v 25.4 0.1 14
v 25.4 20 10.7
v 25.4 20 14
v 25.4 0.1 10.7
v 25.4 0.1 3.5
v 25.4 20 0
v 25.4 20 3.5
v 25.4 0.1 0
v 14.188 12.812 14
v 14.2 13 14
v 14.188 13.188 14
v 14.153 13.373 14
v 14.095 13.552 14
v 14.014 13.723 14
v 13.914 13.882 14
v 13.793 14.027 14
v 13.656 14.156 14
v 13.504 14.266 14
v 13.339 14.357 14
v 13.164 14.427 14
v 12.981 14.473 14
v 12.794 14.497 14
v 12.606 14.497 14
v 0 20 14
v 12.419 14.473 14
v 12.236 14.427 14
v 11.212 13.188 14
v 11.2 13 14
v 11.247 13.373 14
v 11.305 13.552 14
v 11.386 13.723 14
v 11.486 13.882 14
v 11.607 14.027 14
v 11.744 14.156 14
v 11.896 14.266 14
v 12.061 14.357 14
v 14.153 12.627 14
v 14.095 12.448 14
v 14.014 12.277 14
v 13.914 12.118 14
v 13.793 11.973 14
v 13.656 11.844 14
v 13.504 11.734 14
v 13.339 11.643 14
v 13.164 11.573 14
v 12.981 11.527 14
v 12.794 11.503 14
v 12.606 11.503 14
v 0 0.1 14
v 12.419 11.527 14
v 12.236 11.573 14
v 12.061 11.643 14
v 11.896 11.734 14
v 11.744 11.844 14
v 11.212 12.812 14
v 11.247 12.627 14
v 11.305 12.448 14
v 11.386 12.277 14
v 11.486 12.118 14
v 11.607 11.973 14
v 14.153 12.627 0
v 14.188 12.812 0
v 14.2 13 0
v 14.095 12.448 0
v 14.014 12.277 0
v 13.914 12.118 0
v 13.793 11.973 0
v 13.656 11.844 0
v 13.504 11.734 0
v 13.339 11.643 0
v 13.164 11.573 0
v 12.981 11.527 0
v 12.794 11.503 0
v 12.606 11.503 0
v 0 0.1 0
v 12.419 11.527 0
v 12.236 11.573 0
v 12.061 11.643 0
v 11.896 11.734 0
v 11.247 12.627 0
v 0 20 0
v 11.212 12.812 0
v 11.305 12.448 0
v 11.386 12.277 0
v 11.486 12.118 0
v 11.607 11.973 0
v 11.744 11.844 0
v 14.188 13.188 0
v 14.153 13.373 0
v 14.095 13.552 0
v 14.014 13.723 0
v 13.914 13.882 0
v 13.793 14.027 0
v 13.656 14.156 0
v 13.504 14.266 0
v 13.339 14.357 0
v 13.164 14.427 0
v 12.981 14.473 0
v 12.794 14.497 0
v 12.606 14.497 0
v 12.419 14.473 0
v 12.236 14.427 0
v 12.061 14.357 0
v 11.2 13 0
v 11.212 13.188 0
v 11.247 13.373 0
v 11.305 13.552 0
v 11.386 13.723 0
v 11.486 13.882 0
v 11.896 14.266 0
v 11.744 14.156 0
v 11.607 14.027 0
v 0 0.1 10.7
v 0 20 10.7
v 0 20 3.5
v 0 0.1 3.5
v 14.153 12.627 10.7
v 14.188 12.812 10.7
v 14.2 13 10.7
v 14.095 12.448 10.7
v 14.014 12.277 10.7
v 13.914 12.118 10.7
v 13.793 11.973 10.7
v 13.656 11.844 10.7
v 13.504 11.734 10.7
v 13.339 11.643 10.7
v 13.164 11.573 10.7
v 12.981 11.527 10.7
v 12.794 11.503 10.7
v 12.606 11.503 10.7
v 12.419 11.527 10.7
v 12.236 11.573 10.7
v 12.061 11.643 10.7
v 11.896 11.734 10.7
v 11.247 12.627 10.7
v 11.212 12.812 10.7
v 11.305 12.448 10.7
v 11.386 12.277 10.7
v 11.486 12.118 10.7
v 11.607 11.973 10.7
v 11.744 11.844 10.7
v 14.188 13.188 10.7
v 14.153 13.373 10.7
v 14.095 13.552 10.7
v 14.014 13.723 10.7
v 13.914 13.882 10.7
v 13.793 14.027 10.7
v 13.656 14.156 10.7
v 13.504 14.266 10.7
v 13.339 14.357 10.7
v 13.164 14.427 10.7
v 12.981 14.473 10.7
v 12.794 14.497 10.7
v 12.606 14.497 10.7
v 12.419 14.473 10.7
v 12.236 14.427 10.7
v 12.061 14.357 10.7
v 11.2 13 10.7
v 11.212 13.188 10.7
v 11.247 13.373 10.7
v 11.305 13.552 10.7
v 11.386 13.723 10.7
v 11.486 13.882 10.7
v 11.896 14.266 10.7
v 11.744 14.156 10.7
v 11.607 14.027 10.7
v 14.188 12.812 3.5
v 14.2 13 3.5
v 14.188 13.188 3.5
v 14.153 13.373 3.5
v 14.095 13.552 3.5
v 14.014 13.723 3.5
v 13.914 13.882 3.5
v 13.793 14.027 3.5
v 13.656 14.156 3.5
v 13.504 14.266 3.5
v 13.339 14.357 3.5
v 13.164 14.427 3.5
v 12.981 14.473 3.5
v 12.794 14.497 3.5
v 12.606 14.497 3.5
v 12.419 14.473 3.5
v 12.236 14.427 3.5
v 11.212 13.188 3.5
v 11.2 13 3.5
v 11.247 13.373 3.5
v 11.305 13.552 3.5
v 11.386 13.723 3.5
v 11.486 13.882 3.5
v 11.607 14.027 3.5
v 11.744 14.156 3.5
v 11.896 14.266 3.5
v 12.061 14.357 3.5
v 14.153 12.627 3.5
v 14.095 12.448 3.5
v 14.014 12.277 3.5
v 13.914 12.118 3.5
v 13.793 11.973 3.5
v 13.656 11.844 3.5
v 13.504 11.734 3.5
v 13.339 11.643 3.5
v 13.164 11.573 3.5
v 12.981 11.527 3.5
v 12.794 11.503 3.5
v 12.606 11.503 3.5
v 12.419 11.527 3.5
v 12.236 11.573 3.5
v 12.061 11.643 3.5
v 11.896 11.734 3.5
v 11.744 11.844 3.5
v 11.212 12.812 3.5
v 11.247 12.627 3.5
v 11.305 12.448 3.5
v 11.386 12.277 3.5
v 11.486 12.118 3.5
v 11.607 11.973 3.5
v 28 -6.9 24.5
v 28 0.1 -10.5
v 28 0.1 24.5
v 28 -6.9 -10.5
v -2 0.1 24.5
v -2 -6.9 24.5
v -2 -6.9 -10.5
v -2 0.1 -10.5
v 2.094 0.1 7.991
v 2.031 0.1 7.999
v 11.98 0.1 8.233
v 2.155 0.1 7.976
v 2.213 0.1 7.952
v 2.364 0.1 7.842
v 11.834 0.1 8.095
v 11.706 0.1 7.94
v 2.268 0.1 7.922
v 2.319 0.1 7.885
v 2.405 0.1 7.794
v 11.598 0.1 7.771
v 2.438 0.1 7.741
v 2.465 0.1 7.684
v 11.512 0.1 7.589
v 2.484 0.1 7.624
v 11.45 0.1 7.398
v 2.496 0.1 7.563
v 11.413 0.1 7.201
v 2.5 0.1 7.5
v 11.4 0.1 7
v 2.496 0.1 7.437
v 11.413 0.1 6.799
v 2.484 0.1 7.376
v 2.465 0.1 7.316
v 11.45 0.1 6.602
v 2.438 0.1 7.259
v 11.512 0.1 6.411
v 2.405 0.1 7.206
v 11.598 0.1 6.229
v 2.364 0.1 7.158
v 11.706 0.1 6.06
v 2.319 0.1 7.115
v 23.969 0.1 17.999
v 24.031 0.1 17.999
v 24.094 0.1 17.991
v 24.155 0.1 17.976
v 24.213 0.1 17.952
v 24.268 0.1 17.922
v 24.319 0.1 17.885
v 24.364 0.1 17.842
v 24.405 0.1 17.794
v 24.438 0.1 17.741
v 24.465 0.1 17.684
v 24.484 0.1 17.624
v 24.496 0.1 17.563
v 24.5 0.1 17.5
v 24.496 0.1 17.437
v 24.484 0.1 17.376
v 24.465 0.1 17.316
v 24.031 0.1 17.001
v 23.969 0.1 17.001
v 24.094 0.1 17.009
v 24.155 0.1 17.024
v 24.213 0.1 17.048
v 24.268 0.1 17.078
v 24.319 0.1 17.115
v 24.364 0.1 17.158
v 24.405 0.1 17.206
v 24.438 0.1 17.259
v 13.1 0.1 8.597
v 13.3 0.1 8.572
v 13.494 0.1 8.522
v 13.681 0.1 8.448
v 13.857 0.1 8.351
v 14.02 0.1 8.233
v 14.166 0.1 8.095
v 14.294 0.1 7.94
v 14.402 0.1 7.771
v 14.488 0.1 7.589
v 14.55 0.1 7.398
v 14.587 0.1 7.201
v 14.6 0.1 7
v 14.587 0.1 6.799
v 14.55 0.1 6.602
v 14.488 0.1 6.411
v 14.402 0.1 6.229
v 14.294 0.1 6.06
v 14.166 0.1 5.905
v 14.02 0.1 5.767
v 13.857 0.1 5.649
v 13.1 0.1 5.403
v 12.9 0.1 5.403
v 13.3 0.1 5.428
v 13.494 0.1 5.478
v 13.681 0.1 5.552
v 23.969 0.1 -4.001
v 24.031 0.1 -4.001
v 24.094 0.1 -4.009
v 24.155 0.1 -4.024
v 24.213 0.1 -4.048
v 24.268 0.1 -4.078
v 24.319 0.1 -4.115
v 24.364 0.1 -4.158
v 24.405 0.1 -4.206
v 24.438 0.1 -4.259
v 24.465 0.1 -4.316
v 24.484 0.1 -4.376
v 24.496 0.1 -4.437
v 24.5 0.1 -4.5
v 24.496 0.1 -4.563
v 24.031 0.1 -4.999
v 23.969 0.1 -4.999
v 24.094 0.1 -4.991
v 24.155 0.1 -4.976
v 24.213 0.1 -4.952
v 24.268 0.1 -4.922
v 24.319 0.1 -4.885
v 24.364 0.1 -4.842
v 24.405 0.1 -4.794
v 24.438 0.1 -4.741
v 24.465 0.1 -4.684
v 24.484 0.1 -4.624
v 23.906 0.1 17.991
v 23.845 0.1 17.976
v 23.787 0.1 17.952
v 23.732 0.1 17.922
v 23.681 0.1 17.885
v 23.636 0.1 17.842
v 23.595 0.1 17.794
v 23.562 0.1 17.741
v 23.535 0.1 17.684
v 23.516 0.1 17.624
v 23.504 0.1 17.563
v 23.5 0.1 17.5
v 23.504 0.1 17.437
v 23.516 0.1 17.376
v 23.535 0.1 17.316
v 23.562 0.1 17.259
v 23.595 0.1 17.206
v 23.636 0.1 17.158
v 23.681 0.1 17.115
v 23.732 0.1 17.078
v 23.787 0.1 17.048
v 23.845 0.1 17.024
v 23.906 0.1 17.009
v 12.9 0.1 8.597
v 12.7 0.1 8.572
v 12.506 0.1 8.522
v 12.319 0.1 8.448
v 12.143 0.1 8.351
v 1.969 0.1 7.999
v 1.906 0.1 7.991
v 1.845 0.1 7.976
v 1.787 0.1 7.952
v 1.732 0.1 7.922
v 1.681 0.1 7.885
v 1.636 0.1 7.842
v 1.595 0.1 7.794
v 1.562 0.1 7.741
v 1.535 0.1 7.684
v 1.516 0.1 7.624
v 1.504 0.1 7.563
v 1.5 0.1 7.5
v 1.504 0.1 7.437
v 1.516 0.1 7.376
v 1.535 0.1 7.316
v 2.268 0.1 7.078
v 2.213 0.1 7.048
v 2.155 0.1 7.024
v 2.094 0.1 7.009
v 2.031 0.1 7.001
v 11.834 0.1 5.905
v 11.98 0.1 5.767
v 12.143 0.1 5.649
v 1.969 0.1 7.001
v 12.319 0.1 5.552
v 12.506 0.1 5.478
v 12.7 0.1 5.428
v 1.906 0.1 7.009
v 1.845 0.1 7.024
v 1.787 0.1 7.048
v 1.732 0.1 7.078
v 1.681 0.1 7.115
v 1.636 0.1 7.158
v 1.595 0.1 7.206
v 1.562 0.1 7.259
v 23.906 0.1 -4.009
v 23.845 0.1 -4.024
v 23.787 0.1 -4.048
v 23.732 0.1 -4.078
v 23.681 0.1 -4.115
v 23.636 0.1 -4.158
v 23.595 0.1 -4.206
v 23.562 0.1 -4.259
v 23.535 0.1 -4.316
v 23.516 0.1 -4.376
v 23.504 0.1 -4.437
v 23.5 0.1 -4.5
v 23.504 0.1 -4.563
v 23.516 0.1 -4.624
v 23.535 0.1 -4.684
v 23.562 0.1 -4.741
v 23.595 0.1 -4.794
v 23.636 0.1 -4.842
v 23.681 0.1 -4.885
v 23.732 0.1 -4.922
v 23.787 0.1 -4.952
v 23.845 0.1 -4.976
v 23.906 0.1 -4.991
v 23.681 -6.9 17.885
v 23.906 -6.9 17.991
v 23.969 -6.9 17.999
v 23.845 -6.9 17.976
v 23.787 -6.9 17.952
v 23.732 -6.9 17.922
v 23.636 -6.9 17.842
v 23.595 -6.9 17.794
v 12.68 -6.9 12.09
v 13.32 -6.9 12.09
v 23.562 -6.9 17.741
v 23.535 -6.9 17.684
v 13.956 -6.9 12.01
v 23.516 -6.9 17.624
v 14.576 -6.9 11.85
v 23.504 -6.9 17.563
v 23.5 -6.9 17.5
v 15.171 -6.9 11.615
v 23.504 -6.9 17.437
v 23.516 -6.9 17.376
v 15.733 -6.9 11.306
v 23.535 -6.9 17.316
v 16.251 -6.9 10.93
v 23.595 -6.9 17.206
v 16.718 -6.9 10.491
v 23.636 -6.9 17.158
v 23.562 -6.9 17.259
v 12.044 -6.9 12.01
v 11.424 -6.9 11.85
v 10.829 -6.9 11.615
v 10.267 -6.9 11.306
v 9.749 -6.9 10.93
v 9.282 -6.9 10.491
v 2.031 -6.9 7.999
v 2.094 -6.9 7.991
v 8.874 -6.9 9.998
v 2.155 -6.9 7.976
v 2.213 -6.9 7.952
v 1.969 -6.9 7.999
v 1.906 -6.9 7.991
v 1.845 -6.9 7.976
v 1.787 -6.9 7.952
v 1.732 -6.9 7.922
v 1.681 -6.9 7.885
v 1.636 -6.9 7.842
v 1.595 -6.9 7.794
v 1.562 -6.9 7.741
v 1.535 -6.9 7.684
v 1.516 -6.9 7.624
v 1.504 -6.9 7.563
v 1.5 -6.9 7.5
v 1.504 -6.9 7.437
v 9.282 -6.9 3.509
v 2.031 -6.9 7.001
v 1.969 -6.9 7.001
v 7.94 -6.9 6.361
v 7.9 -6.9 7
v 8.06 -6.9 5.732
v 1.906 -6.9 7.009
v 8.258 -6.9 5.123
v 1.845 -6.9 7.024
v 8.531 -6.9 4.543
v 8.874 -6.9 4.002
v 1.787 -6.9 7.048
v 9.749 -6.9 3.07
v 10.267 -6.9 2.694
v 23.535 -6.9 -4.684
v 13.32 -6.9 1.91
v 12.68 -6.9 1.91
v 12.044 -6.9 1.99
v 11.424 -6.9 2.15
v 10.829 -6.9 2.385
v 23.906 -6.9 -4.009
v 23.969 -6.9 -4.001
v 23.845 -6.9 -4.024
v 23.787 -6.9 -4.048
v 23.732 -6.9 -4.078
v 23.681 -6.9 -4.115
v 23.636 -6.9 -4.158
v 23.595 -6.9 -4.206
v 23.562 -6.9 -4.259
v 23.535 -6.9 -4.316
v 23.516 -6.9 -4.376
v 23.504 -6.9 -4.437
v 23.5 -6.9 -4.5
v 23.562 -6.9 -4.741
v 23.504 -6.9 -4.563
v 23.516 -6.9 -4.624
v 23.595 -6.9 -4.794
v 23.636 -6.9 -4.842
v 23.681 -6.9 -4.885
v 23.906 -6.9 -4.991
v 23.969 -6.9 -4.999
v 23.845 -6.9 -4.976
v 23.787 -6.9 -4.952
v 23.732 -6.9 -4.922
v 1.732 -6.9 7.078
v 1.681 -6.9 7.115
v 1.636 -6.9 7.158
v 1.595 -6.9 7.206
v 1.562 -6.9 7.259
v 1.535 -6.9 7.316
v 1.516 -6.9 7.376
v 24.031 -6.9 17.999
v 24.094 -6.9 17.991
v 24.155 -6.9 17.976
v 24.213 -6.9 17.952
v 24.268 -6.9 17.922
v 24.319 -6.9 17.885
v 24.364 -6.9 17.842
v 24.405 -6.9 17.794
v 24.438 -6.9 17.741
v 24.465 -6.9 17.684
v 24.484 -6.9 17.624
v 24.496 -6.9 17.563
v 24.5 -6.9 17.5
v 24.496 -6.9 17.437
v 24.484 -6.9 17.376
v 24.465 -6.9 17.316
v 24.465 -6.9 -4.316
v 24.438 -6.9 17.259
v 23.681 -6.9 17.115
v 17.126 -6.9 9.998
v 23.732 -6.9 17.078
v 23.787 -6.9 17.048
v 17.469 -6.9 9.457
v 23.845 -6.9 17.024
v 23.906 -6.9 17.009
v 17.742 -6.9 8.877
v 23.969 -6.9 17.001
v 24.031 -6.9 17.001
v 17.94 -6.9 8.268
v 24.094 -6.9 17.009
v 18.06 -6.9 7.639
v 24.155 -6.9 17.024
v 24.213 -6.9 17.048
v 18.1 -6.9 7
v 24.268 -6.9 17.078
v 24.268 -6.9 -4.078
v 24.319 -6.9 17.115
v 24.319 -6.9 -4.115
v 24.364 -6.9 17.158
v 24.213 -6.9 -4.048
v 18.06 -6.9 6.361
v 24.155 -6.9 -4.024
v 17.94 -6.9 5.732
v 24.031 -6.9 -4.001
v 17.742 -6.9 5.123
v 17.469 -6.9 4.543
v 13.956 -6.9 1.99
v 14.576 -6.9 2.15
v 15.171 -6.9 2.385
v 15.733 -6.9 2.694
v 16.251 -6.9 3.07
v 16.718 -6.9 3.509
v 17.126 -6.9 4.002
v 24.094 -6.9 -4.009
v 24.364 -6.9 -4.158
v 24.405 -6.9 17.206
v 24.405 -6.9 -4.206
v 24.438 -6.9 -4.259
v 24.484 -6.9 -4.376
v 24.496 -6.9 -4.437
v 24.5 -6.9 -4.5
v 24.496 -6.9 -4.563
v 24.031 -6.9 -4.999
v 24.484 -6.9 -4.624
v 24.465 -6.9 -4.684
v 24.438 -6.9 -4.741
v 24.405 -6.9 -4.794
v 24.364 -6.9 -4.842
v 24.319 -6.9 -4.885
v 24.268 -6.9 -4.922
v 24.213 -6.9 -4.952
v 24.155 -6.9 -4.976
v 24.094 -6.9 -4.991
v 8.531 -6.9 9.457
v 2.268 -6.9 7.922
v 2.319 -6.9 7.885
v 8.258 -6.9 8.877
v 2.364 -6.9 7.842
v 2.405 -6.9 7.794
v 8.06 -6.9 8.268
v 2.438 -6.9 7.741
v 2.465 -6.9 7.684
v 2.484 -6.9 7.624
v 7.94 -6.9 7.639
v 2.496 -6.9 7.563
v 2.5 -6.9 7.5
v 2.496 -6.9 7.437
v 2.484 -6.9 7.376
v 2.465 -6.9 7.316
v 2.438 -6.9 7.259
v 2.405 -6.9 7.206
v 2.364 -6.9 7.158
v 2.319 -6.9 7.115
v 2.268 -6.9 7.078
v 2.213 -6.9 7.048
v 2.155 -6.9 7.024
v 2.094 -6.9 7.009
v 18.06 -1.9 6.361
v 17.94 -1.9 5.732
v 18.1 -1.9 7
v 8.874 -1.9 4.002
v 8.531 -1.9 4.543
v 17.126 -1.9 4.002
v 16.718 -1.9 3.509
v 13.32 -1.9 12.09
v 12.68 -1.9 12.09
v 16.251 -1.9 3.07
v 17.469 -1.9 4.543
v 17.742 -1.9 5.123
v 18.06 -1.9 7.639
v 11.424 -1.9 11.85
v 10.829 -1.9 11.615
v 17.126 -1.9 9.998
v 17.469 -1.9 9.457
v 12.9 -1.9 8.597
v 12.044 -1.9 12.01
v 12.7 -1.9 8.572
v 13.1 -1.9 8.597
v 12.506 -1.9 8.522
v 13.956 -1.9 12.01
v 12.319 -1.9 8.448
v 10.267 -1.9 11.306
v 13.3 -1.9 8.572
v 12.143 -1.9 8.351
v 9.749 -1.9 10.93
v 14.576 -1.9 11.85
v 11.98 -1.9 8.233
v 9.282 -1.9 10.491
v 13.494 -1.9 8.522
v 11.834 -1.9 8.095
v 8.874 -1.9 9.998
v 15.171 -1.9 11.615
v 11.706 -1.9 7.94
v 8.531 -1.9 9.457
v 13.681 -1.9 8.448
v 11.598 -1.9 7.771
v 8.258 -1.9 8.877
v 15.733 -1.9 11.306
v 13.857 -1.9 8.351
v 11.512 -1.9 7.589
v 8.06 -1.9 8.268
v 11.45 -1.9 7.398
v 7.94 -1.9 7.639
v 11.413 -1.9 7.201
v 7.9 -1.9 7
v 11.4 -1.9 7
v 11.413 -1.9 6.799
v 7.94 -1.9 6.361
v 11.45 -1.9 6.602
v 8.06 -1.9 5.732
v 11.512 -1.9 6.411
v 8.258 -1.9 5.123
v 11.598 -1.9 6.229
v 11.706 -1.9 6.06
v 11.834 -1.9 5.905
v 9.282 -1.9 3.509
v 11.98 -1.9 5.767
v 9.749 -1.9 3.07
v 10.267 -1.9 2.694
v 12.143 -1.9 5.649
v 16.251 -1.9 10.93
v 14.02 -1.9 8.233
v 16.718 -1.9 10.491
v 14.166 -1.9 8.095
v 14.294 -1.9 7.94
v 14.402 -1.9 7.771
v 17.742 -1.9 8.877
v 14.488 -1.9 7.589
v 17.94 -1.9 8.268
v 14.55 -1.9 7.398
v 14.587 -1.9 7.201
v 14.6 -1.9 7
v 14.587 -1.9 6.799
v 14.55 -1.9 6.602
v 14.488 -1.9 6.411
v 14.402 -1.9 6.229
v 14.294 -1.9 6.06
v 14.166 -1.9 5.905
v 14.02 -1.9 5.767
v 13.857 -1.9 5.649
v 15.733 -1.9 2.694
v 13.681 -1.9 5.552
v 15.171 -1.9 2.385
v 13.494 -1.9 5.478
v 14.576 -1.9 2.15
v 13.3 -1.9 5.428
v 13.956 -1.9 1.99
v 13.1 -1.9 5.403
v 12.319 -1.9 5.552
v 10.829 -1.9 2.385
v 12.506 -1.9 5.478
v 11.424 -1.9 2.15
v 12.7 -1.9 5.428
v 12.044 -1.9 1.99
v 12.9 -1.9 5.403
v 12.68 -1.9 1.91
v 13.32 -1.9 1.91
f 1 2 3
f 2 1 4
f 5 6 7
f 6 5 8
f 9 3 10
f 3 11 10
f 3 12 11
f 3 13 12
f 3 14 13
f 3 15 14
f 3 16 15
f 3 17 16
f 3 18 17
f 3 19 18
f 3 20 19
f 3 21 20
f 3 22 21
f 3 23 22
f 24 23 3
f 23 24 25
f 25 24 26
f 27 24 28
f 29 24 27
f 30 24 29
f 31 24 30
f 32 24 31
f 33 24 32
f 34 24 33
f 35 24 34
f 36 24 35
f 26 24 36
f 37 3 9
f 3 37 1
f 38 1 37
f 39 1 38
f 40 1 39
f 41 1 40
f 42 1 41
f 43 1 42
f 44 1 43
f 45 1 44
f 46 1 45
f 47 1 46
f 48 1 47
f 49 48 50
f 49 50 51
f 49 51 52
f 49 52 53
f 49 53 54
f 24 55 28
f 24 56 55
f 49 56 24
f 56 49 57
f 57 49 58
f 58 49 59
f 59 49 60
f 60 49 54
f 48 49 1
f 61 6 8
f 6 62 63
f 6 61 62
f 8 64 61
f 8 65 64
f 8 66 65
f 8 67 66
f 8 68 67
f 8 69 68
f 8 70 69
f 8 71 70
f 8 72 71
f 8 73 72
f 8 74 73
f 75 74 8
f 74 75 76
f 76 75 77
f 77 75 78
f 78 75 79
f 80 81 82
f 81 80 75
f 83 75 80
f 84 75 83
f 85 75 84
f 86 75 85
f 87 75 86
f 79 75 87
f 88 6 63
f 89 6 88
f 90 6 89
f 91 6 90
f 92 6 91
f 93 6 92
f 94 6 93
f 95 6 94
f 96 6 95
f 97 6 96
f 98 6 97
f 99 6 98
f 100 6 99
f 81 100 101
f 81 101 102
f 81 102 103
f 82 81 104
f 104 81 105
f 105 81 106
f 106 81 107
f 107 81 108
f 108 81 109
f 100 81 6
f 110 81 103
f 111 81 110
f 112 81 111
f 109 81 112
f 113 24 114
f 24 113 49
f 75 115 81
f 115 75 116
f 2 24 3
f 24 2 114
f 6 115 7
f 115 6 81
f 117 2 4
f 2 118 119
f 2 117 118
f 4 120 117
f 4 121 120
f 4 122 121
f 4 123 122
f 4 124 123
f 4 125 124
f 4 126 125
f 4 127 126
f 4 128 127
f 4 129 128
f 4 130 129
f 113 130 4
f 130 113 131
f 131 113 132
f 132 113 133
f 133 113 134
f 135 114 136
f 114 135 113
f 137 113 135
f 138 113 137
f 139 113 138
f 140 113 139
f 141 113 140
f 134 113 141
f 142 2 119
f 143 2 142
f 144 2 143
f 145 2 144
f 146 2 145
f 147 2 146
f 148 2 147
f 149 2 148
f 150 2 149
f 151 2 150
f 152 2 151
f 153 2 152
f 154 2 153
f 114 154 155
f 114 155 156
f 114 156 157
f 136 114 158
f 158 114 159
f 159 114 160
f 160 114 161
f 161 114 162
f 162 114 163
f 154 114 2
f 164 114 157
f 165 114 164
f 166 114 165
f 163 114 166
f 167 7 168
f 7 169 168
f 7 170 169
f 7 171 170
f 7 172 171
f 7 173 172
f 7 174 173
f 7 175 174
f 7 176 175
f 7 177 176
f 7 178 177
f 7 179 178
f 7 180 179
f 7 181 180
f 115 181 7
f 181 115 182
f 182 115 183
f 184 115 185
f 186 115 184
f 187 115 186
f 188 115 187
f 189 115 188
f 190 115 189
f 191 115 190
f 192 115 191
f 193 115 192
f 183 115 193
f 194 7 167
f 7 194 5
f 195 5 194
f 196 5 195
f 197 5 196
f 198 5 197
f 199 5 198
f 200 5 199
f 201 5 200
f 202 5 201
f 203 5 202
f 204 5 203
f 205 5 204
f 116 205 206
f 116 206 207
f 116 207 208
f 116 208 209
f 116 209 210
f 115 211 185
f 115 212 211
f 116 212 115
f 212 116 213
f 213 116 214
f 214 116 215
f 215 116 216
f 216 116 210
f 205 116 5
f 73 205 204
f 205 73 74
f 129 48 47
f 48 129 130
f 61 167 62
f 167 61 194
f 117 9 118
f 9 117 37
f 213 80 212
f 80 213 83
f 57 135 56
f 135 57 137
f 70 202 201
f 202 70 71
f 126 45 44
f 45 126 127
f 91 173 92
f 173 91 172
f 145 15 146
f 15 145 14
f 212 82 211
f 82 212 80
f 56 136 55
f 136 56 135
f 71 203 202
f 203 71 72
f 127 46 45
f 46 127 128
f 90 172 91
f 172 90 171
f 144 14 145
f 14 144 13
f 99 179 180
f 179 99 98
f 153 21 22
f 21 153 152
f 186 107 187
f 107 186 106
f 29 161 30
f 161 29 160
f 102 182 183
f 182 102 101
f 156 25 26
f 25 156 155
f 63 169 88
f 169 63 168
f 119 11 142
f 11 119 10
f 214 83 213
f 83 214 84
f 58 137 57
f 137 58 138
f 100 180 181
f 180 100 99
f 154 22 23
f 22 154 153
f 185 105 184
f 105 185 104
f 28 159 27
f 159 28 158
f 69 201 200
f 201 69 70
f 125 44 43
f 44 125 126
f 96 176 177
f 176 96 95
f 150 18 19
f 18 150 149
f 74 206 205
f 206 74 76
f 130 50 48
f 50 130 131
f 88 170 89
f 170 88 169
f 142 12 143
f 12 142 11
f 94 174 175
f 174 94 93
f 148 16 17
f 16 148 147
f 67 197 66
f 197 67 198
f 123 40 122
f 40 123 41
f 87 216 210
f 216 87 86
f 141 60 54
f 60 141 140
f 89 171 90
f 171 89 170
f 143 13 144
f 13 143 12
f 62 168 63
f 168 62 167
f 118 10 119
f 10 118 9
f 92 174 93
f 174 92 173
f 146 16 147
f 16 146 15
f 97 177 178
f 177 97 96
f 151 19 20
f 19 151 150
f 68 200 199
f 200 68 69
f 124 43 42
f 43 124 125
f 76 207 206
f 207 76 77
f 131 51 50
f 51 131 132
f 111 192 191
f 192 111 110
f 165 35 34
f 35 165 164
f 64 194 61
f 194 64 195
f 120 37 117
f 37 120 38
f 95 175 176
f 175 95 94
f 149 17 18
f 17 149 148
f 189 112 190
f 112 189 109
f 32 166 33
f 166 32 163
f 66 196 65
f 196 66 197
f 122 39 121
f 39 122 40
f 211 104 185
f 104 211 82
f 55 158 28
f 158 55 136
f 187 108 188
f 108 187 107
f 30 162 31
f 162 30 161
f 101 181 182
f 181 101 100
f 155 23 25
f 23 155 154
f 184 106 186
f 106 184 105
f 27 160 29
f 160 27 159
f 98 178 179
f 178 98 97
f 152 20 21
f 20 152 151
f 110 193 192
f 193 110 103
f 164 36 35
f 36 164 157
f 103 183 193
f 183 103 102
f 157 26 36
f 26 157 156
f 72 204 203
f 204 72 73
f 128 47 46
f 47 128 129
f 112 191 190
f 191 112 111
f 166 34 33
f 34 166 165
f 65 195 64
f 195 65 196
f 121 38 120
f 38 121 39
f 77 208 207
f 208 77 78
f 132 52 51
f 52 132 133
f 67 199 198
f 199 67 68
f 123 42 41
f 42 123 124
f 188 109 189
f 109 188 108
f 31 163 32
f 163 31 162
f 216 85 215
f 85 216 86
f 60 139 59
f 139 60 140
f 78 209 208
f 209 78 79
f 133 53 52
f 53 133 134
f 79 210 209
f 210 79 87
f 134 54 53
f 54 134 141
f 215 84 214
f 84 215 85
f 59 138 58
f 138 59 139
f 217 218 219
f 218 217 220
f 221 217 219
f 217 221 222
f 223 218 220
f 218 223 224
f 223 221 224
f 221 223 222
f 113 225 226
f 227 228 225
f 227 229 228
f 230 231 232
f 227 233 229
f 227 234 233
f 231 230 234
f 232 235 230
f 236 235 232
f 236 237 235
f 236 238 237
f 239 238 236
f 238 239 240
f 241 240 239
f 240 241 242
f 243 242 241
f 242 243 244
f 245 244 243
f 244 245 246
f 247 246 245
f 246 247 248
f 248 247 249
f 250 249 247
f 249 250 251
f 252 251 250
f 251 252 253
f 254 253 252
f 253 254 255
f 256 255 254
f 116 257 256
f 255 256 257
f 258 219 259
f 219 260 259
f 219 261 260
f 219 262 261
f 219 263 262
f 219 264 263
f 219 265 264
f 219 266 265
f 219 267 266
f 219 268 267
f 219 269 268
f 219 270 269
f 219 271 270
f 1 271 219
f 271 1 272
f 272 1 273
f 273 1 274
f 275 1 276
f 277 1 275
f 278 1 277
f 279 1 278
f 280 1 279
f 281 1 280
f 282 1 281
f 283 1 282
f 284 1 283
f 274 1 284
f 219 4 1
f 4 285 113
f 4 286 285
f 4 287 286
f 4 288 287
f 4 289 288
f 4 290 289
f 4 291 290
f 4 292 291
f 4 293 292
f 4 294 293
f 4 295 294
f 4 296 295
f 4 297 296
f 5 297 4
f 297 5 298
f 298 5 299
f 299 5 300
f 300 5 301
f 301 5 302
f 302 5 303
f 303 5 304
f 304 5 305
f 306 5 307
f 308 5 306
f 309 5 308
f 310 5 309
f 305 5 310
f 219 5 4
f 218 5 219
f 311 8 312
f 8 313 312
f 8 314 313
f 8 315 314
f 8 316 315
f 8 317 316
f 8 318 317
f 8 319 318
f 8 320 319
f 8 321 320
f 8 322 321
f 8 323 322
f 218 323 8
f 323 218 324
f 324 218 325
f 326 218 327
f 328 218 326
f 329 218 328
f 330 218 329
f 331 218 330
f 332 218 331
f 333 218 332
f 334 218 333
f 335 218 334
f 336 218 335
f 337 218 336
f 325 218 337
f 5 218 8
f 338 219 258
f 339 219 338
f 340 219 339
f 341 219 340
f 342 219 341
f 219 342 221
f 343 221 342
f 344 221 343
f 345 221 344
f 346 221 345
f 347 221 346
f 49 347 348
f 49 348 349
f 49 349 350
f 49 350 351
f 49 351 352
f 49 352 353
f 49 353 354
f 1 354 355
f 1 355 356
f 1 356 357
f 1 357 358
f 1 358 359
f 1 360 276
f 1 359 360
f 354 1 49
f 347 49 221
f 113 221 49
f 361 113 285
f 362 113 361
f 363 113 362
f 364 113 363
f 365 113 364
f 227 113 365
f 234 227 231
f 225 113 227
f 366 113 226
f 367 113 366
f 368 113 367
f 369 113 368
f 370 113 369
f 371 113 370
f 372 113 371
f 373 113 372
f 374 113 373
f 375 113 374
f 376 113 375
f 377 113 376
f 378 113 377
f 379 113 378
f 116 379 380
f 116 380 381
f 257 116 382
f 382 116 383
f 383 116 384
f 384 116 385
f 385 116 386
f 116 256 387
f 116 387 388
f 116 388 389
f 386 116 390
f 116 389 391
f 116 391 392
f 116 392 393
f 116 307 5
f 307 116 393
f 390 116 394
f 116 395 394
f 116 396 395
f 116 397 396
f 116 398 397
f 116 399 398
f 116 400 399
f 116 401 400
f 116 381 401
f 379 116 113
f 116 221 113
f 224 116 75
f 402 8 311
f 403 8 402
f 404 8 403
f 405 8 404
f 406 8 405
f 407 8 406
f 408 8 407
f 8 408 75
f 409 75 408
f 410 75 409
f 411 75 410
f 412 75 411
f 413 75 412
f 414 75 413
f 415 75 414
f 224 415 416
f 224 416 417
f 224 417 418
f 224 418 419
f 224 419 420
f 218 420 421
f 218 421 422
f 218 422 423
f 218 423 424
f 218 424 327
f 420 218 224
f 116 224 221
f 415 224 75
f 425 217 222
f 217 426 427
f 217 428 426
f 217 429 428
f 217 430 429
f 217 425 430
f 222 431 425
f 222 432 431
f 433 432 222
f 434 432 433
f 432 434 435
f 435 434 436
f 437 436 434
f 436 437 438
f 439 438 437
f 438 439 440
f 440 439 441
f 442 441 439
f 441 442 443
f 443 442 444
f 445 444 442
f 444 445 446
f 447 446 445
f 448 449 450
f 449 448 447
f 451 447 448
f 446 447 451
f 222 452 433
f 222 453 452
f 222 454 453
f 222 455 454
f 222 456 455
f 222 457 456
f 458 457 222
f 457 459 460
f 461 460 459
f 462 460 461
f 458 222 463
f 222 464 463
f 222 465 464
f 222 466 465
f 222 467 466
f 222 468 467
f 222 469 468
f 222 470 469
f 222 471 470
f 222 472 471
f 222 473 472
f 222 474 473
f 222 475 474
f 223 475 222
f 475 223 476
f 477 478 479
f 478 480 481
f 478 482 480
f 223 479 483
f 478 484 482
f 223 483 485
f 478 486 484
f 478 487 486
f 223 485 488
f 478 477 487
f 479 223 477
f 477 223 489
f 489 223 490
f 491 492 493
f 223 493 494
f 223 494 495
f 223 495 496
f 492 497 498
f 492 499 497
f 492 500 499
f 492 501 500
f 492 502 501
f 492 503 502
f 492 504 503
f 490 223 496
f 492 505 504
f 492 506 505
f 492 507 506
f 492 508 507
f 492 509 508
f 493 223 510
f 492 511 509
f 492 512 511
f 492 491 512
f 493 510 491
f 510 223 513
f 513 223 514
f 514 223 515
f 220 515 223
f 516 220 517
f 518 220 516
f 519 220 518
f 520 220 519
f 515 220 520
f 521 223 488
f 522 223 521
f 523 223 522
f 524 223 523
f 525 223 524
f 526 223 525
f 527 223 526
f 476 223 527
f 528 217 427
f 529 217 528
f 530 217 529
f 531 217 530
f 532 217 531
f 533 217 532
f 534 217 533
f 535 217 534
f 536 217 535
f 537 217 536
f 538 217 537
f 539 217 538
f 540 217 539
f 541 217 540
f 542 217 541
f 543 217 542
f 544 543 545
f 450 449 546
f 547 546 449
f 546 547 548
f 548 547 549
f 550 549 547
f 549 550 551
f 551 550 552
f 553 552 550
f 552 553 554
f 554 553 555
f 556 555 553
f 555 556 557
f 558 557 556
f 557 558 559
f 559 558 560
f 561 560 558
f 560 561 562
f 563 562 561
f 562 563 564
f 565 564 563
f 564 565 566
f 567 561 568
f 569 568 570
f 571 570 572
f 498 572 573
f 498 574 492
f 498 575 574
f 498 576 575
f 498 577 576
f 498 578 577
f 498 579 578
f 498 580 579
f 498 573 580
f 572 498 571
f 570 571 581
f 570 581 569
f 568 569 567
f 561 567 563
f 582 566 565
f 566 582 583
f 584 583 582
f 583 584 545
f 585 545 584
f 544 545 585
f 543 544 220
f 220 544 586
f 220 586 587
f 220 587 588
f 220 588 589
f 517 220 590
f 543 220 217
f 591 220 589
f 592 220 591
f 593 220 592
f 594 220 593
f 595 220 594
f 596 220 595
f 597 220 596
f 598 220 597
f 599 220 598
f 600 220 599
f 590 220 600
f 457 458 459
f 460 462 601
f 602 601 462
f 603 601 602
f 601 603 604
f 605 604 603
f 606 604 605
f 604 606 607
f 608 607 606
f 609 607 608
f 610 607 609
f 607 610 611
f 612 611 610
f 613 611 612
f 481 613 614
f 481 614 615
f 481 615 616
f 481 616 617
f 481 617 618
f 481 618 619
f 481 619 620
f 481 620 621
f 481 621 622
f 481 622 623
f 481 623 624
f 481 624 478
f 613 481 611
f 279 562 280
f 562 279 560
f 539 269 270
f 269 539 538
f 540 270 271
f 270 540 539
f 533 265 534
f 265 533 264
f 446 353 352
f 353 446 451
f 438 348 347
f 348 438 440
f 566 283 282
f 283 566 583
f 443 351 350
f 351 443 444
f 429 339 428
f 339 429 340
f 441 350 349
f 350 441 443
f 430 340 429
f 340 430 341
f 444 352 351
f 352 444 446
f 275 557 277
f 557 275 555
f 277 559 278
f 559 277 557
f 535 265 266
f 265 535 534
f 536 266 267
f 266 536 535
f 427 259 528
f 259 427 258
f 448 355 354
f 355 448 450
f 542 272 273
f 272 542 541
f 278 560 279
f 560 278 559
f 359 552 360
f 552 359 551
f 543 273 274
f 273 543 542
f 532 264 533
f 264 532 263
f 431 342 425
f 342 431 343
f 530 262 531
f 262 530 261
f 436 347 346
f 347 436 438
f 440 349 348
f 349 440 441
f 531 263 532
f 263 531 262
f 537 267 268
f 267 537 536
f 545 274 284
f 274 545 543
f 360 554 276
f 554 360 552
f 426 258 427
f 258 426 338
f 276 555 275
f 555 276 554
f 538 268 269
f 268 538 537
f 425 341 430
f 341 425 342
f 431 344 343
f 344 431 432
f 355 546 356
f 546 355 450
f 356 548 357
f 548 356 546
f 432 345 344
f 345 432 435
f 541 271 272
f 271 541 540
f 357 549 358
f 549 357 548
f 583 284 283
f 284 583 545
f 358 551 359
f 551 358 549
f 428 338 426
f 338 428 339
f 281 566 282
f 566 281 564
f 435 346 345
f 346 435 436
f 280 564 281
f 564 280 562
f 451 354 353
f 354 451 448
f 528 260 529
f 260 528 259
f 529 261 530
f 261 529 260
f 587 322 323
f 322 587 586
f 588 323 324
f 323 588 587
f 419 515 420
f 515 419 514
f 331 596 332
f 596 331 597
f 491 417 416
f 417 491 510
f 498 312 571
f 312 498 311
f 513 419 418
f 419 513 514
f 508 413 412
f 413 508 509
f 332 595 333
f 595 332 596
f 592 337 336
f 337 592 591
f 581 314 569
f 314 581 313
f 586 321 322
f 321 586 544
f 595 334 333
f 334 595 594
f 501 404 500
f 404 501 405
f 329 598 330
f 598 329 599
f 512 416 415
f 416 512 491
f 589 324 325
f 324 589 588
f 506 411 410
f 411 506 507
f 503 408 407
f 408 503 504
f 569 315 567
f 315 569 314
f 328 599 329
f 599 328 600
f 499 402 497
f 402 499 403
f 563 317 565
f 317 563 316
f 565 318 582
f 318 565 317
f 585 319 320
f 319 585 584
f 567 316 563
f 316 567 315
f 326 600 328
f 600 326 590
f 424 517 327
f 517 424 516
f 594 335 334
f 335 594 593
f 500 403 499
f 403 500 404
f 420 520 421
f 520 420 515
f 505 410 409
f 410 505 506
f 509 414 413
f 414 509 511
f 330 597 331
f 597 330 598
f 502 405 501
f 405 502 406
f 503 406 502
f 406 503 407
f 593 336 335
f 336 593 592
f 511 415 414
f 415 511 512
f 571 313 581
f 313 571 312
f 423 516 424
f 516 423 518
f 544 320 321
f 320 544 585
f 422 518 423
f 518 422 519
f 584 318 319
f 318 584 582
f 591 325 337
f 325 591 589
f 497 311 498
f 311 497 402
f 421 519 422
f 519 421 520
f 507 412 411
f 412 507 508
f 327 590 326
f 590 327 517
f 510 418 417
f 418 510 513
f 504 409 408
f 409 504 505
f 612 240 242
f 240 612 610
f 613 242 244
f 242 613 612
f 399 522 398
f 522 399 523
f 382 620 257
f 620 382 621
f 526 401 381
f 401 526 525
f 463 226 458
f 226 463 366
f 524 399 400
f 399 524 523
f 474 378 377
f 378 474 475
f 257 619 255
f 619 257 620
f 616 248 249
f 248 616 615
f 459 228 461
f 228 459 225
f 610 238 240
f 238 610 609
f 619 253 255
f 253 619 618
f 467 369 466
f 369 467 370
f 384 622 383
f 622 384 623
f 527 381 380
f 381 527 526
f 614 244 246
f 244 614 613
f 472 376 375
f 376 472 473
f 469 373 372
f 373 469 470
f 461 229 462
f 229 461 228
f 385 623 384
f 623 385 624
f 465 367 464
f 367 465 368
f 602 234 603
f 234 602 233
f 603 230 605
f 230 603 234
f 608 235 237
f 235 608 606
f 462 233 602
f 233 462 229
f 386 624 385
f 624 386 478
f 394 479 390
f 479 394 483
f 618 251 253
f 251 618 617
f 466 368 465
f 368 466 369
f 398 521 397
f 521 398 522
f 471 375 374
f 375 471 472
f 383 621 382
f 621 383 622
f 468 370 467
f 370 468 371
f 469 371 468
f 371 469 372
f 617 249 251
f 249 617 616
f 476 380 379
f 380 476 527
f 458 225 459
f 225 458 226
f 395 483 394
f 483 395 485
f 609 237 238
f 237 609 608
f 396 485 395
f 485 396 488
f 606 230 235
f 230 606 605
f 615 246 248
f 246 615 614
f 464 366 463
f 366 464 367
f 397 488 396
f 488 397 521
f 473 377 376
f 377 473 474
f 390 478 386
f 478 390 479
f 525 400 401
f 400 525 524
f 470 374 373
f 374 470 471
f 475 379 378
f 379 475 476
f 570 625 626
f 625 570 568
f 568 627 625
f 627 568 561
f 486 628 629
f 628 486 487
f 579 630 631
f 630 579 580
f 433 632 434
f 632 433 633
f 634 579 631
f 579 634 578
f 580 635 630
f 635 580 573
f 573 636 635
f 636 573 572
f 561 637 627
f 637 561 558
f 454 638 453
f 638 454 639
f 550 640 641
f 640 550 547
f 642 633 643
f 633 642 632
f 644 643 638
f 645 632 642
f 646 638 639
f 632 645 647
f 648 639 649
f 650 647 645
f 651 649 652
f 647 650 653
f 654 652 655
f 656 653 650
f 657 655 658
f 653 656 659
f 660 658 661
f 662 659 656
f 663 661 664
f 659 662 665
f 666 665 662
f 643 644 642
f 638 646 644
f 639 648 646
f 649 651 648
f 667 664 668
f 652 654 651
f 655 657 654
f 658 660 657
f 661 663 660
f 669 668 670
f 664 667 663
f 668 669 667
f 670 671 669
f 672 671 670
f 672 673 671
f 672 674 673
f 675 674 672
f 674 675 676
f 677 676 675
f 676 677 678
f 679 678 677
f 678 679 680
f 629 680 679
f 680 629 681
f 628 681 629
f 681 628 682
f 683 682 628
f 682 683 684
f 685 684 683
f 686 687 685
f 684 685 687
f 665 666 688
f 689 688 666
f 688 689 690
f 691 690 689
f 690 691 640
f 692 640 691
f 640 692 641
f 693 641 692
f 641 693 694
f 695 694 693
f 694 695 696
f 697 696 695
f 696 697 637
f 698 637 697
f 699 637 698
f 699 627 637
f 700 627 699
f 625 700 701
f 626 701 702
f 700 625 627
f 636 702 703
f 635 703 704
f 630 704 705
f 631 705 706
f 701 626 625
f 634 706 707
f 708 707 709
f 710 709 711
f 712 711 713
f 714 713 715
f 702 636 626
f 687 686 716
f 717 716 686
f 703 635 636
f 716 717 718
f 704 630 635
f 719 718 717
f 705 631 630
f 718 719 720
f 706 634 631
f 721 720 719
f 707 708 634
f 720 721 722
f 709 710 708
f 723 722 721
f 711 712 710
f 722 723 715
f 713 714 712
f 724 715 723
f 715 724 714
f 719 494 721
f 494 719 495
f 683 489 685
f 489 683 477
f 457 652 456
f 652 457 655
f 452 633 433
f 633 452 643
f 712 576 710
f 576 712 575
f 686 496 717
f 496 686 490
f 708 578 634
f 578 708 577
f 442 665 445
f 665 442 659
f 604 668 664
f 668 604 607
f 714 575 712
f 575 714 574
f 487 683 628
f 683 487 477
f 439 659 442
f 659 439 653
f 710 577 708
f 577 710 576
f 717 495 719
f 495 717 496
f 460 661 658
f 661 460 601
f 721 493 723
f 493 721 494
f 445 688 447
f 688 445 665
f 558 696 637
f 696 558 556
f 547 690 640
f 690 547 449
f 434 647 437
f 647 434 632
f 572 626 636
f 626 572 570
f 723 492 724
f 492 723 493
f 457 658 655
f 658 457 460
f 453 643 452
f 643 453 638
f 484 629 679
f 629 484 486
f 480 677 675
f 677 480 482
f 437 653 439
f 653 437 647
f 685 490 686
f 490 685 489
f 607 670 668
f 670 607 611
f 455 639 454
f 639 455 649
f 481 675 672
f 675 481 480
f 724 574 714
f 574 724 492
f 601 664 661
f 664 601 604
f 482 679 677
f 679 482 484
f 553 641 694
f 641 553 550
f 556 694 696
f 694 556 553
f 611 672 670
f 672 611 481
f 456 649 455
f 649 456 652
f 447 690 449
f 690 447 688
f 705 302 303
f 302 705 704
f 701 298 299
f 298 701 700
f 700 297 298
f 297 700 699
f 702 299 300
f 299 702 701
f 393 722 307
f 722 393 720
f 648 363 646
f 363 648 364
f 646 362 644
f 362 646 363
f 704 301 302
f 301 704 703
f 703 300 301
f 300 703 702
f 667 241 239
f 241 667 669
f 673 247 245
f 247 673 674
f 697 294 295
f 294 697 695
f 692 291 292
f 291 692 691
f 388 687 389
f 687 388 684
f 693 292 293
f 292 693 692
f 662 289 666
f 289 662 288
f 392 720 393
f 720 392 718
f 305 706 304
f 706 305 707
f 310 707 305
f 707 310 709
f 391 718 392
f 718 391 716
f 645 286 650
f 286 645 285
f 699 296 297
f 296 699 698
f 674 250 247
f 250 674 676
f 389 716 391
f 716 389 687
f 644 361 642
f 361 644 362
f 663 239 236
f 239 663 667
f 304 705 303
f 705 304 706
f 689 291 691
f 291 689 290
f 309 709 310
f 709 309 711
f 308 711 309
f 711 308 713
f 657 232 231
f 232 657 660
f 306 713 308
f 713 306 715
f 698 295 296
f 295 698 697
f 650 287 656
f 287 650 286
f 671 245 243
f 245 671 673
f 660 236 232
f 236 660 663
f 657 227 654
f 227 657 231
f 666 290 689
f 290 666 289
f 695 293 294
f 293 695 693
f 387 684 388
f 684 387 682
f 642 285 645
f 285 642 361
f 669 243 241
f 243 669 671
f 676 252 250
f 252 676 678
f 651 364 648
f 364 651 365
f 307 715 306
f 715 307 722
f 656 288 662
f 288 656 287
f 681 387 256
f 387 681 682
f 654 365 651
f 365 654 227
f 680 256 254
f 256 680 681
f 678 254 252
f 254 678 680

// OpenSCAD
// petitgripper
// designed for a small humanoid robot
// servo to be inside the bot body to save arm weight and inertia
/* 

Copyright 2020 Howard L. Howell (Les)

Licensed under the Apache License, Version 2.0 (the "License");
you may not use this file except in compliance with the License.
You may obtain a copy of the License at

http://www.apache.org/licenses/LICENSE-2.0

Unless required by applicable law or agreed to in writing, software
distributed under the License is distributed on an "AS IS" BASIS,
WITHOUT WARRANTIES OR CONDITIONS OF ANY KIND, either express or implied.
See the License for the specific language governing permissions and
limitations under the License.
*/


// each element supported by its own pivot and controlled by springs.
// all elements driven simultaneously by a single control, with the springs 
// providing complience
cwidth=7;

module claw(){
    union(){
        scale([1,2,1]){
            difference(){
                cylinder(cwidth,20,20,$fn=50);
                translate([0,0,-1])
                    cylinder(cwidth+2,16,16,$fn=50);
                translate([-2,-40,-1])
                    cube([50,90,cwidth+2]);
            }
        }
        translate([0,-34,0]){
            difference(){
                cylinder(cwidth,6.5,6.5,$fn=50);
                cylinder(cwidth+2,1.5,1.5,$fn=50);
            }
        }
        translate([-1,36,0])
            cylinder(cwidth,4.5,4.5,$fn=50);
        translate([4,-37,0])
            rotate([0,0,0])
                difference(){
                    cube([14,6,cwidth]);
                    translate([10,3,-1])
                        cylinder(cwidth+2,1,1,$fn=50);
                     translate([10,3.5,3.5])
                        rotate([90,0,0])
                            cylinder(cwidth+2,2.75,2.75,$fn=50);               }
    }
}

module clawsupport(){
    difference(){
        union(){
            difference(){
                cube([25.4,20,cwidth*2]); // main bearing block
                translate([-.1,-1,cwidth/2])
                    cube([30,24,cwidth+.2]); // slot for the single 
                translate([12.7,13,-5])
                    cylinder(cwidth*5,1.5,1.5,$fn=50); // claw mount screw hole
            }
            translate([-2,0,-cwidth/2]){
                difference(){
                    translate([0,-6.9,-7])
                        cube([30,7,35]); // platform/base
                    translate([26,2,21])
                        rotate([90,0,0])
                            cylinder(20,.5,.5,$fn=50); // control line hole
                    translate([26,2,-1])
                        rotate([90,0,0])
                            cylinder(20,.5,.5,$fn=50); // control line hole
                    translate([4,2,11])
                        rotate([90,0,0])
                            cylinder(20,.5,.5,$fn=50); // control line hole
                }
            }
        }
        translate([13,-7,7])
            rotate([-90,0,0])
                posthole();
    }
}
module posthole(){
    cylinder(5.1,5.1,5.1,$fn=50); // hole for mounting post
    cylinder(50,1.6,1.6,$fn=50); // hole for mounting post screw
}
module clawmount(){
    difference(){
        union(){
            cylinder(20,5,5,$fn=50);
            translate([-7.5,-7.5,0]){
                cube([15,15,3]);
            }
        }
        translate([0,0,-3])
            cylinder(25,1.5,1.5,$fn=50);
    }
}
//claw();
//rotate([90,0,0])
clawsupport();
//translate([0,0,-30])
//clawmount();
